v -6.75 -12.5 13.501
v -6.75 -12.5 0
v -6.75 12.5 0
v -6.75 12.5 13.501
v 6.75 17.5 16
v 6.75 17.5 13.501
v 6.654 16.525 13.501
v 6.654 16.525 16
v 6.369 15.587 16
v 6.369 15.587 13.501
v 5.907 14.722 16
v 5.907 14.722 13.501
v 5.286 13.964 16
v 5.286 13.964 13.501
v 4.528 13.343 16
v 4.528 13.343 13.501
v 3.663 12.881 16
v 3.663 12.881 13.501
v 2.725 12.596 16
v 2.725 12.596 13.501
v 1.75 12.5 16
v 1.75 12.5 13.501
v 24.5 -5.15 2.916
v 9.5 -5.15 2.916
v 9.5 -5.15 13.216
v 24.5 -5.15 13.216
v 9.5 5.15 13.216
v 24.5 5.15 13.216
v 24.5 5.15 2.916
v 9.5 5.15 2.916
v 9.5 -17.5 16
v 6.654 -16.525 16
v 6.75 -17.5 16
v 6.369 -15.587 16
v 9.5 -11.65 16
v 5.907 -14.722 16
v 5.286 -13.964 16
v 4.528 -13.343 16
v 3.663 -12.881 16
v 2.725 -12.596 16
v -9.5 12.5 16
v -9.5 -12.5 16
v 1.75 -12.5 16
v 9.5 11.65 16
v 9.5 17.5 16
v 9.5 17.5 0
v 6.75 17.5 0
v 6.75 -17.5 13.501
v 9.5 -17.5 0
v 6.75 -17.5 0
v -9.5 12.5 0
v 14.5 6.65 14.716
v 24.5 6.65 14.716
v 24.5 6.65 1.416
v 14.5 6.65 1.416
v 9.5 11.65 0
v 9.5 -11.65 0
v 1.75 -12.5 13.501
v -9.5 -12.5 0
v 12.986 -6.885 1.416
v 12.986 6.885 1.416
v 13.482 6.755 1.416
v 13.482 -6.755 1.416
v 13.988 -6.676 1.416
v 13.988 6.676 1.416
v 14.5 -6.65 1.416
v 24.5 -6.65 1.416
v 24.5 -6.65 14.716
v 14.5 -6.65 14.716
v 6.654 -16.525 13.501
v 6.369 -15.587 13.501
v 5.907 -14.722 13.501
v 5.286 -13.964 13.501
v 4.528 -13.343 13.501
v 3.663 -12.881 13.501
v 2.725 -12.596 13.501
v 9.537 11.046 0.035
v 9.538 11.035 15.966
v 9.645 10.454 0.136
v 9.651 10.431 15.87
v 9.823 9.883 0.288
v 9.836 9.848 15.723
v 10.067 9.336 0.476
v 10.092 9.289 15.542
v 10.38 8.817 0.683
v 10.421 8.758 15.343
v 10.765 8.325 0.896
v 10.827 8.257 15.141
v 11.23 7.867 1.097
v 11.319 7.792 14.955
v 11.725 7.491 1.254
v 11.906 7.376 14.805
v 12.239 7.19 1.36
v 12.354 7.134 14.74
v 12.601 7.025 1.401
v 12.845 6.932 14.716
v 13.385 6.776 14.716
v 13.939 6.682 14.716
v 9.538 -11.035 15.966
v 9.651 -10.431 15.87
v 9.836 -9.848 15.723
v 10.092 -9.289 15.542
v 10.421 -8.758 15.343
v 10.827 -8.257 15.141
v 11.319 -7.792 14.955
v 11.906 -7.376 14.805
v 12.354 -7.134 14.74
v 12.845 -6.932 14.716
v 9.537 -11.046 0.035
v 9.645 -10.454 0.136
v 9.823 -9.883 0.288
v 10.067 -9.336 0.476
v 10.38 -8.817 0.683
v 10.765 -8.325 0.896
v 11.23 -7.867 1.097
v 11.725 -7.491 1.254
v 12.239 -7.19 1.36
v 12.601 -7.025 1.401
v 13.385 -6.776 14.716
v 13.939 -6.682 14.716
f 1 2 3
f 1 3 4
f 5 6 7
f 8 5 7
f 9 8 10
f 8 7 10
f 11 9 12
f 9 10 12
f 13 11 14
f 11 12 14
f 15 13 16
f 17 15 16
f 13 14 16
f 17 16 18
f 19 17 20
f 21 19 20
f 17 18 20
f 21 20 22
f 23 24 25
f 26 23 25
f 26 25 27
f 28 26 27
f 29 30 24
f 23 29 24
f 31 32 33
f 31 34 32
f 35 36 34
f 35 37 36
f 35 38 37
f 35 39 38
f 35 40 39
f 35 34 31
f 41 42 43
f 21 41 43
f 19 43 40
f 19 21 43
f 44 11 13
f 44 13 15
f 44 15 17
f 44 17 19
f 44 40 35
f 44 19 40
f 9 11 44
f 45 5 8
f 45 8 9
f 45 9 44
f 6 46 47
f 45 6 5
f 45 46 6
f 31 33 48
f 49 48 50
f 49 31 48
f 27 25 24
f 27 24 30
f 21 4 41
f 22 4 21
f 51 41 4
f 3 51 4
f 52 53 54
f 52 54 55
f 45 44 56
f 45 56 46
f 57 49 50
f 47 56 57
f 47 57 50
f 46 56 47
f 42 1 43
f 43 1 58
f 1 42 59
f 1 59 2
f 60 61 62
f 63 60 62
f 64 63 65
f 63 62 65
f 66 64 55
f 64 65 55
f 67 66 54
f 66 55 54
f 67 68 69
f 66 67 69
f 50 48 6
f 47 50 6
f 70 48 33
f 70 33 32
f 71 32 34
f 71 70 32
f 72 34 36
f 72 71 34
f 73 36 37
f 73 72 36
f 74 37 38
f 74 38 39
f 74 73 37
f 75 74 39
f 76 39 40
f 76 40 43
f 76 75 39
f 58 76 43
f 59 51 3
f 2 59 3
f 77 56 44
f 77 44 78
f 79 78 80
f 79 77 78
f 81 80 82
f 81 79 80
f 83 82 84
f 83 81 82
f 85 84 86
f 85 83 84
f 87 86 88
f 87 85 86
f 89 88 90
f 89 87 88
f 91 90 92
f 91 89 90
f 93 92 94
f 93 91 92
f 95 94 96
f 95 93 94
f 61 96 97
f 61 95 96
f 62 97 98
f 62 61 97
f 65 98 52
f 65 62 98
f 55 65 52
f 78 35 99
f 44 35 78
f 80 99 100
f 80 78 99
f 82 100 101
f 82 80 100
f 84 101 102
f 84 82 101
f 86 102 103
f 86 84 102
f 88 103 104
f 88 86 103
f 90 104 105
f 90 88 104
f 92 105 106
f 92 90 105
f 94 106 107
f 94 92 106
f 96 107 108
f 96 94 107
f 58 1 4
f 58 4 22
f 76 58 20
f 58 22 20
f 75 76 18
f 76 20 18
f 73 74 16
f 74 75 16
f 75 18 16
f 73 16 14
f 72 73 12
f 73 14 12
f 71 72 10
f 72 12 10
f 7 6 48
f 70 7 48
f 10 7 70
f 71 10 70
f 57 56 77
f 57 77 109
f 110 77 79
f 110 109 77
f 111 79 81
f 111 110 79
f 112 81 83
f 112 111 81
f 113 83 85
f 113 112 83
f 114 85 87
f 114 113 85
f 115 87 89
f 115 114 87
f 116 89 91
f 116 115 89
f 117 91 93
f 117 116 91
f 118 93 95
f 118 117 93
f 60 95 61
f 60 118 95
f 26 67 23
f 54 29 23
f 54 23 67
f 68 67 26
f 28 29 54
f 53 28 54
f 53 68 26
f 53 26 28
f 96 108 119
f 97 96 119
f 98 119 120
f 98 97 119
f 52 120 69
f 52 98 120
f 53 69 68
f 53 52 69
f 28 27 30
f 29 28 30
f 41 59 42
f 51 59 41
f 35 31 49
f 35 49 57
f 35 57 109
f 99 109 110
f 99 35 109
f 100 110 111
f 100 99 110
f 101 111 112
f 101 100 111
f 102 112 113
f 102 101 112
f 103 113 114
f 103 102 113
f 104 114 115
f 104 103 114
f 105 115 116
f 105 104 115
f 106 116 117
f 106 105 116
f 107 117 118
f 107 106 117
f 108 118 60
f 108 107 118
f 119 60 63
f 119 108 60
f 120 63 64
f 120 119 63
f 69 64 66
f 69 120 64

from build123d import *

# Parameters (mm, degrees)
F0_W         = 19
F0_H         = 25
F1_DEPTH     = 16
F2_W         = 13.5
F2_H         = 13.5011018194
F3_DEPTH     = 50
F4_W         = 5.15
F4_H         = 10.3
F5_DEPTH     = 2.75
F6_DEPTH     = 15
F7_T1_DEPTH  = 2.4988981806
F7_T3_DEPTH  = 13.2999992773
F7_T5_DEPTH  = 13.2999992773
F7_T11_DEPTH = 21.6634917276
F7_T15_DEPTH = 25.7999992773
F7_T23_DEPTH = 21.6634917276
F7_T27_DEPTH = 25.7999992773
F7_T35_DEPTH = 22.0158699277
F7_T39_DEPTH = 25.7999992773
F7_T47_DEPTH = 25.7999992773
F7_T52_DEPTH = 22.0158699277


# Not quite as in the source:
# - a fillet or chamfer that OpenCascade refuses, or shapes differently, is made with other operations: its cross-section is extruded or revolved along the edge and cut away or added
# - a feature names something its author has since deleted; it is built from what else it names


with BuildPart() as f1:
    # F0 (on Top) → F1 (new body)
    with BuildSketch(Plane.XY):
        Rectangle(F0_W, F0_H)
    extrude(amount=F1_DEPTH)

    # F2 (on face) → F3 (cut)
    with BuildSketch(Plane.XZ.offset(12.5)):
        with Locations((0, 6.7505509097)):
            Rectangle(F2_W, F2_H)
    extrude(amount=-F3_DEPTH, mode=Mode.SUBTRACT)

    # F4 (on face) → F5 (join)
    with BuildSketch(Plane.YZ.offset(9.5)):
        Polygon((0, 16), (-17.5, 16), (-17.5, 0), (0, 0), (0, 1.4159553841), (-6.6499996386, 1.4159553841), (-6.6499996386, 14.7159546614), (0, 14.7159546614), align=None)
        Polygon((17.5, 16), (0, 16), (0, 14.7159546614), (6.6499996386, 14.7159546614), (6.6499996386, 1.4159553841), (0, 1.4159553841), (0, 0), (17.5, 0), align=None)
        with Locations((-2.575, 8.0659550227)):
            Rectangle(F4_W, F4_H)
        with Locations((2.575, 8.0659550227)):
            Rectangle(F4_W, F4_H)
        Polygon((0, 13.2159550227), (0, 14.7159546614), (-6.6499996386, 14.7159546614), (-6.6499996386, 1.4159553841), (0, 1.4159553841), (0, 2.9159550227), (-5.15, 2.9159550227), (-5.15, 13.2159550227), align=None)
        Polygon((6.6499996386, 14.7159546614), (0, 14.7159546614), (0, 13.2159550227), (5.15, 13.2159550227), (5.15, 2.9159550227), (0, 2.9159550227), (0, 1.4159553841), (6.6499996386, 1.4159553841), align=None)
    extrude(amount=-F5_DEPTH)

    # F4 (on face) → F6 (join)
    with BuildSketch(Plane.YZ.offset(9.5)):
        Polygon((0, 13.2159550227), (0, 14.7159546614), (-6.6499996386, 14.7159546614), (-6.6499996386, 1.4159553841), (0, 1.4159553841), (0, 2.9159550227), (-5.15, 2.9159550227), (-5.15, 13.2159550227), align=None)
        Polygon((6.6499996386, 14.7159546614), (0, 14.7159546614), (0, 13.2159550227), (5.15, 13.2159550227), (5.15, 2.9159550227), (0, 2.9159550227), (0, 1.4159553841), (6.6499996386, 1.4159553841), align=None)
    extrude(amount=F6_DEPTH)

    # F7: fillet of radius 5 on 6 edges, made by hand

    # F7_s2 → F7_t1 (join)
    with BuildSketch(Plane.XY.offset(13.5011018194)):
        with BuildLine():
            ThreePointArc((6.75, 17.5), (5.2855339059, 13.9644660941), (1.75, 12.5))
            Line((1.75, 12.5), (6.75, 12.5))
            Line((6.75, 12.5), (6.75, 17.5))
        make_face()
        with BuildLine():
            ThreePointArc((6.75, -17.5), (5.2855339059, -13.9644660941), (1.75, -12.5))
            Line((1.75, -12.5), (6.75, -12.5))
            Line((6.75, -12.5), (6.75, -17.5))
        make_face()
    extrude(amount=F7_T1_DEPTH)

    # F7_s4 → F7_t3 (join)
    with BuildSketch(Plane.XZ.offset(-6.6499996386)):
        with BuildLine():
            ThreePointArc((9.5, 16), (11.0537180617, 15.0479907955), (12.8453969801, 14.7159546614))
            Line((12.8453969801, 14.7159546614), (9.5, 14.7159546614))
            Line((9.5, 14.7159546614), (9.5, 16))
        make_face()
        with BuildLine():
            ThreePointArc((9.5, 0), (11.1048891295, 1.0484613517), (12.9863482602, 1.4159553841))
            Line((12.9863482602, 1.4159553841), (9.5, 1.4159553841))
            Line((9.5, 1.4159553841), (9.5, 0))
        make_face()
    extrude(amount=F7_T3_DEPTH)

    # F7_s6 → F7_t5 (join)
    with BuildSketch(Plane.XY.offset(1.4159553841)):
        with BuildLine():
            ThreePointArc((9.5, -11.6499996386), (10.9644660941, -8.1144657327), (14.5, -6.6499996386))
            Line((14.5, -6.6499996386), (9.5, -6.6499996386))
            Line((9.5, -6.6499996386), (9.5, -11.6499996386))
        make_face()
        with BuildLine():
            ThreePointArc((9.5, 11.6499996386), (10.9644660941, 8.1144657327), (14.5, 6.6499996386))
            Line((14.5, 6.6499996386), (9.5, 6.6499996386))
            Line((9.5, 6.6499996386), (9.5, 11.6499996386))
        make_face()
    extrude(amount=F7_T5_DEPTH)


with BuildPart() as f7_tool9:
    # F7_s10 → F7_t11 (new body)
    with BuildSketch(Plane.XZ.offset(-15.013492089)):
        with BuildLine():
            ThreePointArc((9.5, 16), (11.0537180617, 15.0479907955), (12.8453969801, 14.7159546614))
            Line((12.8453969801, 14.7159546614), (9.5, 14.7159546614))
            Line((9.5, 14.7159546614), (9.5, 16))
        make_face()
    extrude(amount=F7_T11_DEPTH)

    split(bisect_by=Plane.XZ.offset(-6.6499996386), keep=Keep.BOTTOM)


with BuildPart() as f7_tool13:
    # F7_s14 → F7_t15 (new body)
    with BuildSketch(Plane.XY.offset(1.4159553841)):
        with BuildLine():
            ThreePointArc((9.5, 11.6499996386), (10.9644660941, 8.1144657327), (14.5, 6.6499996386))
            Line((14.5, 6.6499996386), (9.5, 6.6499996386))
            Line((9.5, 6.6499996386), (9.5, 11.6499996386))
        make_face()
    extrude(amount=F7_T15_DEPTH)

    split(bisect_by=Plane.XY.offset(16), keep=Keep.BOTTOM)

    split(bisect_by=Plane.XY.offset(14.7159546614), keep=Keep.TOP)


with BuildPart() as f7_tool9_1:
    add(f7_tool9.part)

    # F7_t18: intersect F7_tool13
    add(f7_tool13.part, mode=Mode.INTERSECT)


with BuildPart() as f1_1:
    add(f1.part)

    # F7_t7: union F7_tool9
    add(f7_tool9_1.part)


with BuildPart() as f7_tool21:
    # F7_s22 → F7_t23 (new body)
    with BuildSketch(Plane.XZ.offset(-6.6499996386)):
        with BuildLine():
            ThreePointArc((9.5, 16), (11.0537180617, 15.0479907955), (12.8453969801, 14.7159546614))
            Line((12.8453969801, 14.7159546614), (9.5, 14.7159546614))
            Line((9.5, 14.7159546614), (9.5, 16))
        make_face()
    extrude(amount=F7_T23_DEPTH)

    split(bisect_by=Plane.XZ.offset(6.6499996386), keep=Keep.TOP)


with BuildPart() as f7_tool25:
    # F7_s26 → F7_t27 (new body)
    with BuildSketch(Plane.XY.offset(27.2159546614)):
        with BuildLine():
            ThreePointArc((9.5, -11.6499996386), (10.9644660941, -8.1144657327), (14.5, -6.6499996386))
            Line((14.5, -6.6499996386), (9.5, -6.6499996386))
            Line((9.5, -6.6499996386), (9.5, -11.6499996386))
        make_face()
    extrude(amount=-F7_T27_DEPTH)

    split(bisect_by=Plane.XY.offset(16), keep=Keep.BOTTOM)

    split(bisect_by=Plane.XY.offset(14.7159546614), keep=Keep.TOP)


with BuildPart() as f7_tool21_1:
    add(f7_tool21.part)

    # F7_t30: intersect F7_tool25
    add(f7_tool25.part, mode=Mode.INTERSECT)


with BuildPart() as f1_2:
    add(f1_1.part)

    # F7_t19: union F7_tool21
    add(f7_tool21_1.part)


with BuildPart() as f7_tool33:
    # F7_s34 → F7_t35 (new body)
    with BuildSketch(Plane.XZ.offset(15.365870289)):
        with BuildLine():
            ThreePointArc((9.5, 0), (11.1048891295, 1.0484613517), (12.9863482602, 1.4159553841))
            Line((12.9863482602, 1.4159553841), (9.5, 1.4159553841))
            Line((9.5, 1.4159553841), (9.5, 0))
        make_face()
    extrude(amount=-F7_T35_DEPTH)

    split(bisect_by=Plane.XZ.offset(6.6499996386), keep=Keep.TOP)


with BuildPart() as f7_tool37:
    # F7_s38 → F7_t39 (new body)
    with BuildSketch(Plane.XY.offset(14.7159546614)):
        with BuildLine():
            ThreePointArc((9.5, -11.6499996386), (10.9644660941, -8.1144657327), (14.5, -6.6499996386))
            Line((14.5, -6.6499996386), (9.5, -6.6499996386))
            Line((9.5, -6.6499996386), (9.5, -11.6499996386))
        make_face()
    extrude(amount=-F7_T39_DEPTH)

    split(bisect_by=Plane.XY, keep=Keep.TOP)

    split(bisect_by=Plane.XY.offset(1.4159553841), keep=Keep.BOTTOM)


with BuildPart() as f7_tool33_1:
    add(f7_tool33.part)

    # F7_t42: intersect F7_tool37
    add(f7_tool37.part, mode=Mode.INTERSECT)


with BuildPart() as f1_3:
    add(f1_2.part)

    # F7_t31: union F7_tool33
    add(f7_tool33_1.part)


with BuildPart() as f7_tool45:
    # F7_s46 → F7_t47 (new body)
    with BuildSketch(Plane.XY.offset(-11.0840446159)):
        with BuildLine():
            ThreePointArc((9.5, 11.6499996386), (10.9644660941, 8.1144657327), (14.5, 6.6499996386))
            Line((14.5, 6.6499996386), (9.5, 6.6499996386))
            Line((9.5, 6.6499996386), (9.5, 11.6499996386))
        make_face()
    extrude(amount=F7_T47_DEPTH)

    split(bisect_by=Plane.XY, keep=Keep.TOP)

    split(bisect_by=Plane.XY.offset(1.4159553841), keep=Keep.BOTTOM)


with BuildPart() as f7_tool50:
    # F7_s51 → F7_t52 (new body)
    with BuildSketch(Plane.XZ.offset(6.6499996386)):
        with BuildLine():
            ThreePointArc((9.5, 0), (11.1048891295, 1.0484613517), (12.9863482602, 1.4159553841))
            Line((12.9863482602, 1.4159553841), (9.5, 1.4159553841))
            Line((9.5, 1.4159553841), (9.5, 0))
        make_face()
    extrude(amount=-F7_T52_DEPTH)

    split(bisect_by=Plane.XZ.offset(-6.6499996386), keep=Keep.BOTTOM)


with BuildPart() as f7_tool45_1:
    add(f7_tool45.part)

    # F7_t54: intersect F7_tool50
    add(f7_tool50.part, mode=Mode.INTERSECT)


with BuildPart() as f1_4:
    add(f1_3.part)

    # F7_t43: union F7_tool45
    add(f7_tool45_1.part)


solid = f1_4.part
